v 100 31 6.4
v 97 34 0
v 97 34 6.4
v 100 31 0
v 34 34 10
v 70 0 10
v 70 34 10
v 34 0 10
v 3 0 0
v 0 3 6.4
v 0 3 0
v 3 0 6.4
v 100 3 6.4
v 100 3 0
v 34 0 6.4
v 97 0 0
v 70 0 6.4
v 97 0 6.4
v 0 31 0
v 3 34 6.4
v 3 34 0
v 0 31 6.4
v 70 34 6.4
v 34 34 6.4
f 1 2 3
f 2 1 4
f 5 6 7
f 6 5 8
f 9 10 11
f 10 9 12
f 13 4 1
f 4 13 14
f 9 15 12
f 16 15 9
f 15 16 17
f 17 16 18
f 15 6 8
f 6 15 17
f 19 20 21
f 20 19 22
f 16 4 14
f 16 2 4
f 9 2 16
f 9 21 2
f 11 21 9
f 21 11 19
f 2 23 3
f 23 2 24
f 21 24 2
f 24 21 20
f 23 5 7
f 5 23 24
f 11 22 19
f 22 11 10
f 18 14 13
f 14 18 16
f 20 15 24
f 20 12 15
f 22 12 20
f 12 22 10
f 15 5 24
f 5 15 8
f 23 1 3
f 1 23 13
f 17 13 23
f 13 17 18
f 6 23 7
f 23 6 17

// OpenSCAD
$fn = 32;

// ----------------------------------------------------------------------
// Stepped bar: centerstep, 100 x 34 x 10/6.4 mm
// ----------------------------------------------------------------------

// --- parameters (mm) ---
bar_l = 100;              // bar length, X
bar_w = 34;               // bar width, Y
plate_t = 10;             // thickness of the thick zone, Z
thin_t = 6.4;             // thickness of the thin zone
corner_c = 3;             // corner chamfer of the bar
step_cut = 3.6;           // material removed from the thin zone
thick_from = 34;          // start of the thick middle zone
thick_to = 70;            // end of the thick middle zone
depth_1 = 3.6;            // depth of cut 1 from the top face
depth_2 = 3.6;            // depth of cut 2 from the top face
fit_tol = 0.05;           // declared fit tolerance (prompt contract)
free_tol = 0.2;           // declared free tolerance (prompt contract)

profile = [[3, 0], [97, 0], [100, 3], [100, 31], [97, 34], [3, 34], [0, 31], [0, 3]];  // primary outline, 8 points, counter clockwise
void_1 = [[-1, -1], [34, -1], [34, 35], [-1, 35]];  // thin left end, 4 points
void_2 = [[70, -1], [101, -1], [101, 35], [70, 35]];  // thin right end, 4 points

// --- the one profile operation ---
difference() {
  linear_extrude(height = plate_t) polygon(points = profile);
  translate([0, 0, plate_t - depth_1])
    linear_extrude(height = depth_1 + 1) polygon(points = void_1);
  translate([0, 0, plate_t - depth_2])
    linear_extrude(height = depth_2 + 1) polygon(points = void_2);
}
